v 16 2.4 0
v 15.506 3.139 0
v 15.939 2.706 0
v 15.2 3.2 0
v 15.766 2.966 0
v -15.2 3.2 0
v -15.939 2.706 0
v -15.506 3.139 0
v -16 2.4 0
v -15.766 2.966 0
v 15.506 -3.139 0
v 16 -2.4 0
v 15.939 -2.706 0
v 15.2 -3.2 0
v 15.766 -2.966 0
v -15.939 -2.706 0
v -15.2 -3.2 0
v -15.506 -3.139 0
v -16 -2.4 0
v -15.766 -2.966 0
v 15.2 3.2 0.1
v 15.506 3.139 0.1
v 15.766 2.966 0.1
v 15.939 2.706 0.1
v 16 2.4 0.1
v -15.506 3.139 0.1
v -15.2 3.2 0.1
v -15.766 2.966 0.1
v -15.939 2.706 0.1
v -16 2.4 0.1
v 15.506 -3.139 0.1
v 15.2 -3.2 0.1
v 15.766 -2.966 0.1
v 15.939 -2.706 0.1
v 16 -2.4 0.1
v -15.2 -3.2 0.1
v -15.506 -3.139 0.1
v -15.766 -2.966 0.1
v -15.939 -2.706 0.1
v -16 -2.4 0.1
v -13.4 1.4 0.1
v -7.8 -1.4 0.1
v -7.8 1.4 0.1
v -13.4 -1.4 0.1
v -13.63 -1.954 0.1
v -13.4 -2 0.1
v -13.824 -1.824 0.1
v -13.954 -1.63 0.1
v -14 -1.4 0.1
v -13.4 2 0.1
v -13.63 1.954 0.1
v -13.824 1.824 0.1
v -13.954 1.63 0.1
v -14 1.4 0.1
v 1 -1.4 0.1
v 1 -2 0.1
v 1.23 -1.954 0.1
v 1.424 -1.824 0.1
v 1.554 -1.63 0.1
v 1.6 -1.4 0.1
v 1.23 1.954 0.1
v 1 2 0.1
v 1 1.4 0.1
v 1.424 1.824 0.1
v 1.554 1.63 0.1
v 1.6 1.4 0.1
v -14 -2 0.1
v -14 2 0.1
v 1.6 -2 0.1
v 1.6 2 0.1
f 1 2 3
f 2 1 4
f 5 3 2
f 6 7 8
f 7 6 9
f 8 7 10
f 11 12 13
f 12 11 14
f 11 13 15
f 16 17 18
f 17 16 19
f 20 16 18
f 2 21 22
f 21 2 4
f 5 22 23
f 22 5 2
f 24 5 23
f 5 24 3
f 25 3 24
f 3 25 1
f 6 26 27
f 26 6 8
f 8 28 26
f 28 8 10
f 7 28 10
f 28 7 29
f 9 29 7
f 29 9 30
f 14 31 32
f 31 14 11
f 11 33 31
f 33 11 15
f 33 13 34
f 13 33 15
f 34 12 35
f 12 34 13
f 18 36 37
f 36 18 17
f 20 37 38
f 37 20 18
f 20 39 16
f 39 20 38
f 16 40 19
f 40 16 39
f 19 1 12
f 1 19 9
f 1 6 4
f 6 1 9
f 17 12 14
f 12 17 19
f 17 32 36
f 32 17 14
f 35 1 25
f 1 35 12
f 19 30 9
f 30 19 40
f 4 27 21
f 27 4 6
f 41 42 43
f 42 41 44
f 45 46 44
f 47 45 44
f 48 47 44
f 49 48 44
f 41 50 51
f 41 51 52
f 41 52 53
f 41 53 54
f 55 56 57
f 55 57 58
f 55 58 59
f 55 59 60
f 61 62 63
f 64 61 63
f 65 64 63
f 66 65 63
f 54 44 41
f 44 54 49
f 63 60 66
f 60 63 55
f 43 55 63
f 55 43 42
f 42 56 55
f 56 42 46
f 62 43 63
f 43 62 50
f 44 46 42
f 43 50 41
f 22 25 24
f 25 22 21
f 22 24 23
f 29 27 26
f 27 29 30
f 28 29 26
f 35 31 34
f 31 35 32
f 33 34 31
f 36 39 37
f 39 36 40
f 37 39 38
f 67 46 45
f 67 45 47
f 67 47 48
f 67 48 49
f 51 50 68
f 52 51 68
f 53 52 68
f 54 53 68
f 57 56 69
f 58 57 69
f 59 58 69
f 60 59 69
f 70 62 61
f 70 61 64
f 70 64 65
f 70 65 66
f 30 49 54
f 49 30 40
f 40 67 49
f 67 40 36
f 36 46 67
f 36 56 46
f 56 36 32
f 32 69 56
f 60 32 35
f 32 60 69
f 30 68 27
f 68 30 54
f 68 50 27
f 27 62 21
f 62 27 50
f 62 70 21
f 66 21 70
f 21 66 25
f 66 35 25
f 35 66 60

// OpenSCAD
// file: ../p/4-4edge.scad
use <../lib.scad>
$fa=1; $fs=0.2;
function ldraw_lib__4_4edge(realsolid=false) = [
// 0 Circle 1.0
// 0 Name: 4-4edge.dat
// 0 Author: James Jessiman
// 0 !LDRAW_ORG Primitive UPDATE 2017-01
// 0 !LICENSE Licensed under CC BY 2.0 and CC BY 4.0 : see CAreadme.txt
// 
// 0 BFC CERTIFY CCW
  [0,"BFC","CERTIFY"],
  [0,"BFC","CCW"],
// 
// 0 !HISTORY 1998-12-15 [PTadmin] Official Update 1998-10
// 0 !HISTORY 2005-12-28 [PTadmin] Official Update 2005-01
// 0 !HISTORY 2007-06-24 [PTadmin] Header formatted for Contributor Agreement
// 0 !HISTORY 2008-07-01 [PTadmin] Official Update 2008-01
// 0 !HISTORY 2017-01-15 [Steffen] BFCed
// 0 !HISTORY 2017-12-30 [PTadmin] Official Update 2017-01
// 
// 
// 2 24 1 0 0 0.9239 0 0.3827
  [2,24,1,0,0,0.9239,0,0.3827],
// 2 24 0.9239 0 0.3827 0.7071 0 0.7071
  [2,24,0.9239,0,0.3827,0.7071,0,0.7071],
// 2 24 0.7071 0 0.7071 0.3827 0 0.9239
  [2,24,0.7071,0,0.7071,0.3827,0,0.9239],
// 2 24 0.3827 0 0.9239 0 0 1
  [2,24,0.3827,0,0.9239,0,0,1],
// 2 24 0 0 1 -0.3827 0 0.9239
  [2,24,0,0,1,-0.3827,0,0.9239],
// 2 24 -0.3827 0 0.9239 -0.7071 0 0.7071
  [2,24,-0.3827,0,0.9239,-0.7071,0,0.7071],
// 2 24 -0.7071 0 0.7071 -0.9239 0 0.3827
  [2,24,-0.7071,0,0.7071,-0.9239,0,0.3827],
// 2 24 -0.9239 0 0.3827 -1 0 -0
  [2,24,-0.9239,0,0.3827,-1,0,-0],
// 2 24 -1 0 -0 -0.9239 0 -0.3827
  [2,24,-1,0,-0,-0.9239,0,-0.3827],
// 2 24 -0.9239 0 -0.3827 -0.7071 0 -0.7071
  [2,24,-0.9239,0,-0.3827,-0.7071,0,-0.7071],
// 2 24 -0.7071 0 -0.7071 -0.3827 0 -0.9239
  [2,24,-0.7071,0,-0.7071,-0.3827,0,-0.9239],
// 2 24 -0.3827 0 -0.9239 0 0 -1
  [2,24,-0.3827,0,-0.9239,0,0,-1],
// 2 24 0 0 -1 0.3827 0 -0.9239
  [2,24,0,0,-1,0.3827,0,-0.9239],
// 2 24 0.3827 0 -0.9239 0.7071 0 -0.7071
  [2,24,0.3827,0,-0.9239,0.7071,0,-0.7071],
// 2 24 0.7071 0 -0.7071 0.9239 0 -0.3827
  [2,24,0.7071,0,-0.7071,0.9239,0,-0.3827],
// 2 24 0.9239 0 -0.3827 1 0 0
  [2,24,0.9239,0,-0.3827,1,0,0],
];
module ldraw_lib__4_4edge(step=0, col=false, unit=2/5, alt=false, line=0.2, solid=!$preview)
    makepoly(ldraw_lib__4_4edge(solid), step=step, col=col, unit=unit, alt=alt, line=line, solid=solid);
ldraw_lib__4_4edge(line=0.2);
// file: ../p/4-4disc.scad
use <../lib.scad>
$fa=1; $fs=0.2;
function ldraw_lib__4_4disc(realsolid=false) = [
// 0 Disc 1.0
// 0 Name: 4-4disc.dat
// 0 Author: James Jessiman
// 0 !LDRAW_ORG Primitive UPDATE 2002-02
// 0 !LICENSE Licensed under CC BY 2.0 and CC BY 4.0 : see CAreadme.txt
// 
// 0 BFC CERTIFY CCW
  [0,"BFC","CERTIFY"],
  [0,"BFC","CCW"],
// 
// 0 !HISTORY 1998-12-15 [PTadmin] Official Update 1998-10
// 0 !HISTORY 2002-03-23 [sbliss] Added BFC statement
// 0 !HISTORY 2002-04-25 [PTadmin] Official Update 2002-02
// 0 !HISTORY 2007-06-24 [PTadmin] Header formatted for Contributor Agreement
// 0 !HISTORY 2008-07-01 [PTadmin] Official Update 2008-01
// 
// 
// 3 16 0 0 0 1 0 0 0.9239 0 0.3827
  [3,16,0,0,0,1,0,0,0.9239,0,0.3827],
// 3 16 0 0 0 0.9239 0 0.3827 0.7071 0 0.7071
  [3,16,0,0,0,0.9239,0,0.3827,0.7071,0,0.7071],
// 3 16 0 0 0 0.7071 0 0.7071 0.3827 0 0.9239
  [3,16,0,0,0,0.7071,0,0.7071,0.3827,0,0.9239],
// 3 16 0 0 0 0.3827 0 0.9239 0 0 1
  [3,16,0,0,0,0.3827,0,0.9239,0,0,1],
// 3 16 0 0 0 0 0 1 -0.3827 0 0.9239
  [3,16,0,0,0,0,0,1,-0.3827,0,0.9239],
// 3 16 0 0 0 -0.3827 0 0.9239 -0.7071 0 0.7071
  [3,16,0,0,0,-0.3827,0,0.9239,-0.7071,0,0.7071],
// 3 16 0 0 0 -0.7071 0 0.7071 -0.9239 0 0.3827
  [3,16,0,0,0,-0.7071,0,0.7071,-0.9239,0,0.3827],
// 3 16 0 0 0 -0.9239 0 0.3827 -1 0 -0
  [3,16,0,0,0,-0.9239,0,0.3827,-1,0,-0],
// 3 16 0 0 0 -1 0 -0 -0.9239 0 -0.3827
  [3,16,0,0,0,-1,0,-0,-0.9239,0,-0.3827],
// 3 16 0 0 0 -0.9239 0 -0.3827 -0.7071 0 -0.7071
  [3,16,0,0,0,-0.9239,0,-0.3827,-0.7071,0,-0.7071],
// 3 16 0 0 0 -0.7071 0 -0.7071 -0.3827 0 -0.9239
  [3,16,0,0,0,-0.7071,0,-0.7071,-0.3827,0,-0.9239],
// 3 16 0 0 0 -0.3827 0 -0.9239 0 0 -1
  [3,16,0,0,0,-0.3827,0,-0.9239,0,0,-1],
// 3 16 0 0 0 0 0 -1 0.3827 0 -0.9239
  [3,16,0,0,0,0,0,-1,0.3827,0,-0.9239],
// 3 16 0 0 0 0.3827 0 -0.9239 0.7071 0 -0.7071
  [3,16,0,0,0,0.3827,0,-0.9239,0.7071,0,-0.7071],
// 3 16 0 0 0 0.7071 0 -0.7071 0.9239 0 -0.3827
  [3,16,0,0,0,0.7071,0,-0.7071,0.9239,0,-0.3827],
// 3 16 0 0 0 0.9239 0 -0.3827 1 0 0
  [3,16,0,0,0,0.9239,0,-0.3827,1,0,0],
// 0
];
module ldraw_lib__4_4disc(step=0, col=false, unit=2/5, alt=false, line=0.2, solid=!$preview)
    makepoly(ldraw_lib__4_4disc(solid), step=step, col=col, unit=unit, alt=alt, line=line, solid=solid);
ldraw_lib__4_4disc(line=0.2);
// file: ../p/4-4cyli.scad
use <../lib.scad>
$fa=1; $fs=0.2;
function ldraw_lib__4_4cyli(realsolid=false) = [
// 0 Cylinder 1.0
// 0 Name: 4-4cyli.dat
// 0 Author: James Jessiman
// 0 !LDRAW_ORG Primitive UPDATE 2005-01
// 0 !LICENSE Licensed under CC BY 2.0 and CC BY 4.0 : see CAreadme.txt
// 
// 0 BFC CERTIFY CCW
  [0,"BFC","CERTIFY"],
  [0,"BFC","CCW"],
// 
// 0 !HISTORY 1998-12-15 [PTadmin] Official Update 1998-10
// 0 !HISTORY 2002-03-23 [sbliss] Added BFC statement; merged headers from files in distributions LDraw 0.27 and Complete.
// 0 !HISTORY 2002-04-25 [PTadmin] Official Update 2002-02
// 0 !HISTORY 2004-12-14 [guyvivan] BFC CCW
// 0 !HISTORY 2005-12-28 [PTadmin] Official Update 2005-01
// 0 !HISTORY 2007-06-24 [PTadmin] Header formatted for Contributor Agreement
// 0 !HISTORY 2008-07-01 [PTadmin] Official Update 2008-01
// 
// 
// 4 16 1 1 0 0.9239 1 0.3827 0.9239 0 0.3827 1 0 0
  [4,16,1,1,0,0.9239,1,0.3827,0.9239,0,0.3827,1,0,0],
// 5 24 1 0 0 1 1 0 0.9239 0 0.3827 0.9239 0 -0.3827
  [5,24,1,0,0,1,1,0,0.9239,0,0.3827,0.9239,0,-0.3827],
// 4 16 0.9239 1 0.3827 0.7071 1 0.7071 0.7071 0 0.7071 0.9239 0 0.3827
  [4,16,0.9239,1,0.3827,0.7071,1,0.7071,0.7071,0,0.7071,0.9239,0,0.3827],
// 5 24 0.9239 0 0.3827 0.9239 1 0.3827 0.7071 0 0.7071 1 0 0
  [5,24,0.9239,0,0.3827,0.9239,1,0.3827,0.7071,0,0.7071,1,0,0],
// 4 16 0.7071 1 0.7071 0.3827 1 0.9239 0.3827 0 0.9239 0.7071 0 0.7071
  [4,16,0.7071,1,0.7071,0.3827,1,0.9239,0.3827,0,0.9239,0.7071,0,0.7071],
// 5 24 0.7071 0 0.7071 0.7071 1 0.7071 0.3827 0 0.9239 0.9239 0 0.3827
  [5,24,0.7071,0,0.7071,0.7071,1,0.7071,0.3827,0,0.9239,0.9239,0,0.3827],
// 4 16 0.3827 1 0.9239 0 1 1 0 0 1 0.3827 0 0.9239
  [4,16,0.3827,1,0.9239,0,1,1,0,0,1,0.3827,0,0.9239],
// 5 24 0.3827 0 0.9239 0.3827 1 0.9239 0 0 1 0.7071 0 0.7071
  [5,24,0.3827,0,0.9239,0.3827,1,0.9239,0,0,1,0.7071,0,0.7071],
// 4 16 0 1 1 -0.3827 1 0.9239 -0.3827 0 0.9239 0 0 1
  [4,16,0,1,1,-0.3827,1,0.9239,-0.3827,0,0.9239,0,0,1],
// 5 24 0 0 1 0 1 1 -0.3827 0 0.9239 0.3827 0 0.9239
  [5,24,0,0,1,0,1,1,-0.3827,0,0.9239,0.3827,0,0.9239],
// 4 16 -0.3827 1 0.9239 -0.7071 1 0.7071 -0.7071 0 0.7071 -0.3827 0 0.9239
  [4,16,-0.3827,1,0.9239,-0.7071,1,0.7071,-0.7071,0,0.7071,-0.3827,0,0.9239],
// 5 24 -0.3827 0 0.9239 -0.3827 1 0.9239 -0.7071 0 0.7071 0 0 1
  [5,24,-0.3827,0,0.9239,-0.3827,1,0.9239,-0.7071,0,0.7071,0,0,1],
// 4 16 -0.7071 1 0.7071 -0.9239 1 0.3827 -0.9239 0 0.3827 -0.7071 0 0.7071
  [4,16,-0.7071,1,0.7071,-0.9239,1,0.3827,-0.9239,0,0.3827,-0.7071,0,0.7071],
// 5 24 -0.7071 0 0.7071 -0.7071 1 0.7071 -0.9239 0 0.3827 -0.3827 0 0.9239
  [5,24,-0.7071,0,0.7071,-0.7071,1,0.7071,-0.9239,0,0.3827,-0.3827,0,0.9239],
// 4 16 -0.9239 1 0.3827 -1 1 0 -1 0 0 -0.9239 0 0.3827
  [4,16,-0.9239,1,0.3827,-1,1,0,-1,0,0,-0.9239,0,0.3827],
// 5 24 -0.9239 0 0.3827 -0.9239 1 0.3827 -1 0 0 -0.7071 0 0.7071
  [5,24,-0.9239,0,0.3827,-0.9239,1,0.3827,-1,0,0,-0.7071,0,0.7071],
// 4 16 -1 1 0 -0.9239 1 -0.3827 -0.9239 0 -0.3827 -1 0 0
  [4,16,-1,1,0,-0.9239,1,-0.3827,-0.9239,0,-0.3827,-1,0,0],
// 5 24 -1 0 0 -1 1 0 -0.9239 0 -0.3827 -0.9239 0 0.3827
  [5,24,-1,0,0,-1,1,0,-0.9239,0,-0.3827,-0.9239,0,0.3827],
// 4 16 -0.9239 1 -0.3827 -0.7071 1 -0.7071 -0.7071 0 -0.7071 -0.9239 0 -0.3827
  [4,16,-0.9239,1,-0.3827,-0.7071,1,-0.7071,-0.7071,0,-0.7071,-0.9239,0,-0.3827],
// 5 24 -0.9239 0 -0.3827 -0.9239 1 -0.3827 -0.7071 0 -0.7071 -1 0 0
  [5,24,-0.9239,0,-0.3827,-0.9239,1,-0.3827,-0.7071,0,-0.7071,-1,0,0],
// 4 16 -0.7071 1 -0.7071 -0.3827 1 -0.9239 -0.3827 0 -0.9239 -0.7071 0 -0.7071
  [4,16,-0.7071,1,-0.7071,-0.3827,1,-0.9239,-0.3827,0,-0.9239,-0.7071,0,-0.7071],
// 5 24 -0.7071 0 -0.7071 -0.7071 1 -0.7071 -0.3827 0 -0.9239 -0.9239 0 -0.3827
  [5,24,-0.7071,0,-0.7071,-0.7071,1,-0.7071,-0.3827,0,-0.9239,-0.9239,0,-0.3827],
// 4 16 -0.3827 1 -0.9239 0 1 -1 0 0 -1 -0.3827 0 -0.9239
  [4,16,-0.3827,1,-0.9239,0,1,-1,0,0,-1,-0.3827,0,-0.9239],
// 5 24 -0.3827 0 -0.9239 -0.3827 1 -0.9239 0 0 -1 -0.7071 0 -0.7071
  [5,24,-0.3827,0,-0.9239,-0.3827,1,-0.9239,0,0,-1,-0.7071,0,-0.7071],
// 4 16 0 1 -1 0.3827 1 -0.9239 0.3827 0 -0.9239 0 0 -1
  [4,16,0,1,-1,0.3827,1,-0.9239,0.3827,0,-0.9239,0,0,-1],
// 5 24 0 0 -1 0 1 -1 0.3827 0 -0.9239 -0.3827 0 -0.9239
  [5,24,0,0,-1,0,1,-1,0.3827,0,-0.9239,-0.3827,0,-0.9239],
// 4 16 0.3827 1 -0.9239 0.7071 1 -0.7071 0.7071 0 -0.7071 0.3827 0 -0.9239
  [4,16,0.3827,1,-0.9239,0.7071,1,-0.7071,0.7071,0,-0.7071,0.3827,0,-0.9239],
// 5 24 0.3827 0 -0.9239 0.3827 1 -0.9239 0.7071 0 -0.7071 0 0 -1
  [5,24,0.3827,0,-0.9239,0.3827,1,-0.9239,0.7071,0,-0.7071,0,0,-1],
// 4 16 0.7071 1 -0.7071 0.9239 1 -0.3827 0.9239 0 -0.3827 0.7071 0 -0.7071
  [4,16,0.7071,1,-0.7071,0.9239,1,-0.3827,0.9239,0,-0.3827,0.7071,0,-0.7071],
// 5 24 0.7071 0 -0.7071 0.7071 1 -0.7071 0.9239 0 -0.3827 0.3827 0 -0.9239
  [5,24,0.7071,0,-0.7071,0.7071,1,-0.7071,0.9239,0,-0.3827,0.3827,0,-0.9239],
// 4 16 0.9239 1 -0.3827 1 1 0 1 0 0 0.9239 0 -0.3827
  [4,16,0.9239,1,-0.3827,1,1,0,1,0,0,0.9239,0,-0.3827],
// 5 24 0.9239 0 -0.3827 0.9239 1 -0.3827 1 0 0 0.7071 0 -0.7071
  [5,24,0.9239,0,-0.3827,0.9239,1,-0.3827,1,0,0,0.7071,0,-0.7071],
// 0
];
module ldraw_lib__4_4cyli(step=0, col=false, unit=2/5, alt=false, line=0.2, solid=!$preview)
    makepoly(ldraw_lib__4_4cyli(solid), step=step, col=col, unit=unit, alt=alt, line=line, solid=solid);
ldraw_lib__4_4cyli(line=0.2);
// file: ../p/stud3.scad
use <../lib.scad>
use <4-4cyli.scad>
use <4-4disc.scad>
use <4-4edge.scad>
$fa=1; $fs=0.2;
function ldraw_lib__stud3(realsolid=false) = realsolid ? 
    [openscad(translate([0,0,-eps()], o=cylinder(4+eps(), r=4)),2)] : [
// 0 Stud Tube Solid
// 0 Name: stud3.dat
// 0 Author: James Jessiman
// 0 !LDRAW_ORG Primitive UPDATE 2012-01
// 0 !LICENSE Licensed under CC BY 2.0 and CC BY 4.0 : see CAreadme.txt
// 
// 0 BFC CERTIFY CCW
  [0,"BFC","CERTIFY"],
  [0,"BFC","CCW"],
// 
// 0 !HISTORY 2002-04-04 [sbliss] Modified for BFC compliance
// 0 !HISTORY 2002-04-25 [PTadmin] Official Update 2002-02
// 0 !HISTORY 2007-06-24 [PTadmin] Header formatted for Contributor Agreement
// 0 !HISTORY 2008-07-01 [PTadmin] Official Update 2008-01
// 0 !HISTORY 2012-02-16 [Philo] Changed to CCW
// 0 !HISTORY 2012-03-30 [PTadmin] Official Update 2012-01
// 
// 
// 1 16 0 -4 0 4 0 0 0 1 0 0 0 4 4-4edge.dat
  [1,16,0,-4,0,4,0,0,0,1,0,0,0,4, ldraw_lib__4_4edge(realsolid)],
// 1 16 0 0 0 4 0 0 0 1 0 0 0 4 4-4edge.dat
  [1,16,0,0,0,4,0,0,0,1,0,0,0,4, ldraw_lib__4_4edge(realsolid)],
// 1 16 0 -4 0 4 0 0 0 1 0 0 0 4 4-4disc.dat
  [1,16,0,-4,0,4,0,0,0,1,0,0,0,4, ldraw_lib__4_4disc(realsolid)],
// 1 16 0 -4 0 4 0 0 0 4 0 0 0 4 4-4cyli.dat
  [1,16,0,-4,0,4,0,0,0,4,0,0,0,4, ldraw_lib__4_4cyli(realsolid)],
];
module ldraw_lib__stud3(step=0, col=false, unit=2/5, alt=false, line=0.2, solid=!$preview)
    makepoly(ldraw_lib__stud3(solid), step=step, col=col, unit=unit, alt=alt, line=line, solid=solid);
ldraw_lib__stud3(line=0.2);
// file: ../p/stud.scad
use <../lib.scad>
use <4-4cyli.scad>
use <4-4disc.scad>
use <4-4edge.scad>
$fa=1; $fs=0.2;
function ldraw_lib__stud(realsolid=false) = realsolid ? 
    [openscad(translate([0,0,-eps()], o=cylinder(4+eps(), r=6)),2)] : [
// 0 Stud
// 0 Name: stud.dat
// 0 Author: James Jessiman
// 0 !LDRAW_ORG Primitive UPDATE 2012-01
// 0 !LICENSE Licensed under CC BY 2.0 and CC BY 4.0 : see CAreadme.txt
// 
// 0 BFC CERTIFY CCW
  [0,"BFC","CERTIFY"],
  [0,"BFC","CCW"],
// 
// 0 !HISTORY 2002-04-04 [sbliss] Modified for BFC compliance
// 0 !HISTORY 2002-04-25 [PTadmin] Official Update 2002-02
// 0 !HISTORY 2007-06-24 [PTadmin] Header formatted for Contributor Agreement
// 0 !HISTORY 2008-07-01 [PTadmin] Official Update 2008-01
// 0 !HISTORY 2012-02-16 [Philo] Changed to CCW
// 0 !HISTORY 2012-03-30 [PTadmin] Official Update 2012-01
// 
// 
// 1 16 0 0 0 6 0 0 0 1 0 0 0 6 4-4edge.dat
  [1,16,0,0,0,6,0,0,0,1,0,0,0,6, ldraw_lib__4_4edge(realsolid)],
// 1 16 0 -4 0 6 0 0 0 1 0 0 0 6 4-4edge.dat
  [1,16,0,-4,0,6,0,0,0,1,0,0,0,6, ldraw_lib__4_4edge(realsolid)],
// 1 16 0 0 0 6 0 0 0 -4 0 0 0 6 4-4cyli.dat
  [1,16,0,0,0,6,0,0,0,-4,0,0,0,6, ldraw_lib__4_4cyli(realsolid)],
// 1 16 0 -4 0 6 0 0 0 1 0 0 0 6 4-4disc.dat
  [1,16,0,-4,0,6,0,0,0,1,0,0,0,6, ldraw_lib__4_4disc(realsolid)],
];
module ldraw_lib__stud(step=0, col=false, unit=2/5, alt=false, line=0.2, solid=!$preview)
    makepoly(ldraw_lib__stud(solid), step=step, col=col, unit=unit, alt=alt, line=line, solid=solid);
ldraw_lib__stud(line=0.2);
// file: ../p/box5.scad
use <../lib.scad>
$fa=1; $fs=0.2;
function ldraw_lib__box5(realsolid=false) = [
// 0 Box with 5 Faces and All Edges
// 0 Name: box5.dat
// 0 Author: James Jessiman
// 0 !LDRAW_ORG Primitive UPDATE 2012-01
// 0 !LICENSE Licensed under CC BY 2.0 and CC BY 4.0 : see CAreadme.txt
// 
// 0 BFC CERTIFY CCW
  [0,"BFC","CERTIFY"],
  [0,"BFC","CCW"],
// 
// 0 !HISTORY 2002-04-03 [sbliss] Modified for BFC compliance
// 0 !HISTORY 2002-04-25 [PTadmin] Official Update 2002-02
// 0 !HISTORY 2007-06-24 [PTadmin] Header formatted for Contributor Agreement
// 0 !HISTORY 2008-07-01 [PTadmin] Official Update 2008-01
// 0 !HISTORY 2012-02-16 [Philo] Changed to CCW
// 0 !HISTORY 2012-03-30 [PTadmin] Official Update 2012-01
// 
// 
// 2 24 1 1 1 -1 1 1
  [2,24,1,1,1,-1,1,1],
// 2 24 -1 1 1 -1 1 -1
  [2,24,-1,1,1,-1,1,-1],
// 2 24 -1 1 -1 1 1 -1
  [2,24,-1,1,-1,1,1,-1],
// 2 24 1 1 -1 1 1 1
  [2,24,1,1,-1,1,1,1],
// 2 24 1 0 1 -1 0 1
  [2,24,1,0,1,-1,0,1],
// 2 24 -1 0 1 -1 0 -1
  [2,24,-1,0,1,-1,0,-1],
// 2 24 -1 0 -1 1 0 -1
  [2,24,-1,0,-1,1,0,-1],
// 2 24 1 0 -1 1 0 1
  [2,24,1,0,-1,1,0,1],
// 2 24 1 0 1 1 1 1
  [2,24,1,0,1,1,1,1],
// 2 24 -1 0 1 -1 1 1
  [2,24,-1,0,1,-1,1,1],
// 2 24 1 0 -1 1 1 -1
  [2,24,1,0,-1,1,1,-1],
// 2 24 -1 0 -1 -1 1 -1
  [2,24,-1,0,-1,-1,1,-1],
// 4 16 -1 1 1 1 1 1 1 1 -1 -1 1 -1
  [4,16,-1,1,1,1,1,1,1,1,-1,-1,1,-1],
// 4 16 -1 1 1 -1 0 1 1 0 1 1 1 1
  [4,16,-1,1,1,-1,0,1,1,0,1,1,1,1],
// 4 16 -1 1 -1 -1 0 -1 -1 0 1 -1 1 1
  [4,16,-1,1,-1,-1,0,-1,-1,0,1,-1,1,1],
// 4 16 1 1 -1 1 0 -1 -1 0 -1 -1 1 -1
  [4,16,1,1,-1,1,0,-1,-1,0,-1,-1,1,-1],
// 4 16 1 1 1 1 0 1 1 0 -1 1 1 -1
  [4,16,1,1,1,1,0,1,1,0,-1,1,1,-1],
];
module ldraw_lib__box5(step=0, col=false, unit=2/5, alt=false, line=0.2, solid=!$preview)
    makepoly(ldraw_lib__box5(solid), step=step, col=col, unit=unit, alt=alt, line=line, solid=solid);
ldraw_lib__box5(line=0.2);
// file: ../p/box4t.scad
use <../lib.scad>
$fa=1; $fs=0.2;
function ldraw_lib__box4t(realsolid=false) = [
// 0 Box with 4 Adjacent Faces and All Edges
// 0 Name: box4t.dat
// 0 Author: Tore Eriksson [Tore_Eriksson]
// 0 !LDRAW_ORG Primitive UPDATE 2003-02
// 0 !LICENSE Licensed under CC BY 2.0 and CC BY 4.0 : see CAreadme.txt
// 
// 0 BFC CERTIFY CCW
  [0,"BFC","CERTIFY"],
  [0,"BFC","CCW"],
// 
// 0 !HISTORY 1997-09-29 [PTadmin] Official Update 1997-15
// 0 !HISTORY 2002-08-31 [izanette] Modified with WINDZ for BFC compliance
// 0 !HISTORY 2003-08-01 [PTadmin] Official Update 2003-02
// 0 !HISTORY 2007-06-24 [PTadmin] Header formatted for Contributor Agreement
// 0 !HISTORY 2008-07-01 [PTadmin] Official Update 2008-01
// 
// 
// 2 24 1 1 1 -1 1 1
  [2,24,1,1,1,-1,1,1],
// 2 24 -1 1 1 -1 1 -1
  [2,24,-1,1,1,-1,1,-1],
// 2 24 -1 1 -1 1 1 -1
  [2,24,-1,1,-1,1,1,-1],
// 2 24 1 1 -1 1 1 1
  [2,24,1,1,-1,1,1,1],
// 2 24 1 0 1 -1 0 1
  [2,24,1,0,1,-1,0,1],
// 2 24 -1 0 1 -1 0 -1
  [2,24,-1,0,1,-1,0,-1],
// 2 24 -1 0 -1 1 0 -1
  [2,24,-1,0,-1,1,0,-1],
// 2 24 1 0 -1 1 0 1
  [2,24,1,0,-1,1,0,1],
// 2 24 1 0 1 1 1 1
  [2,24,1,0,1,1,1,1],
// 2 24 -1 0 1 -1 1 1
  [2,24,-1,0,1,-1,1,1],
// 2 24 1 0 -1 1 1 -1
  [2,24,1,0,-1,1,1,-1],
// 2 24 -1 0 -1 -1 1 -1
  [2,24,-1,0,-1,-1,1,-1],
// 4 16 1 1 1 1 1 -1 -1 1 -1 -1 1 1
  [4,16,1,1,1,1,1,-1,-1,1,-1,-1,1,1],
// 4 16 1 1 1 -1 1 1 -1 0 1 1 0 1
  [4,16,1,1,1,-1,1,1,-1,0,1,1,0,1],
// 4 16 -1 1 1 -1 1 -1 -1 0 -1 -1 0 1
  [4,16,-1,1,1,-1,1,-1,-1,0,-1,-1,0,1],
// 0 4 16 -1 1 -1 -1 0 -1 1 0 -1 1 1 -1
// 4 16 1 1 -1 1 1 1 1 0 1 1 0 -1
  [4,16,1,1,-1,1,1,1,1,0,1,1,0,-1],
// 0
];
module ldraw_lib__box4t(step=0, col=false, unit=2/5, alt=false, line=0.2, solid=!$preview)
    makepoly(ldraw_lib__box4t(solid), step=step, col=col, unit=unit, alt=alt, line=line, solid=solid);
ldraw_lib__box4t(line=0.2);
// file: s/3004s01.scad
use <../../lib.scad>
use <../../p/box4t.scad>
use <../../p/box5.scad>
use <../../p/stud.scad>
use <../../p/stud3.scad>
$fa=1; $fs=0.2;
function ldraw_lib__s__3004s01(realsolid=false) = [
// 0 ~Brick  1 x  2 without Front Face
// 0 Name: s\3004s01.dat
// 0 Author: James Jessiman
// 0 !LDRAW_ORG Subpart UPDATE 2003-03
// 0 !LICENSE Licensed under CC BY 2.0 and CC BY 4.0 : see CAreadme.txt
// 
// 0 BFC CERTIFY CCW
  [0,"BFC","CERTIFY"],
  [0,"BFC","CCW"],
// 
// 0 !HISTORY 2003-09-07 [jriley] Subfiling, BFC
// 0 !HISTORY 2003-12-19 [PTadmin] Official Update 2003-03
// 0 !HISTORY 2007-08-29 [PTadmin] Header formatted for Contributor Agreement
// 0 !HISTORY 2008-07-01 [PTadmin] Official Update 2008-01
// 
// 
// 1 16 0 4 0 1 0 0 0 -5 0 0 0 1 stud3.dat
  [1,16,0,4,0,1,0,0,0,-5,0,0,0,1, ldraw_lib__stud3(realsolid)],
// 0 BFC INVERTNEXT
  [0,"BFC","INVERTNEXT"],
// 1 16 0 24 0 16 0 0 0 -20 0 0 0 6 box5.dat
  [1,16,0,24,0,16,0,0,0,-20,0,0,0,6, ldraw_lib__box5(realsolid)],
// 4 16 20 24 10 16 24 6 -16 24 6 -20 24 10
  [4,16,20,24,10,16,24,6,-16,24,6,-20,24,10],
// 4 16 -20 24 10 -16 24 6 -16 24 -6 -20 24 -10
  [4,16,-20,24,10,-16,24,6,-16,24,-6,-20,24,-10],
// 4 16 -20 24 -10 -16 24 -6 16 24 -6 20 24 -10
  [4,16,-20,24,-10,-16,24,-6,16,24,-6,20,24,-10],
// 4 16 20 24 -10 16 24 -6 16 24 6 20 24 10
  [4,16,20,24,-10,16,24,-6,16,24,6,20,24,10],
// 1 16 0 24 0 20 0 0 0 -24 0 0 0 10 box4t.dat
  [1,16,0,24,0,20,0,0,0,-24,0,0,0,10, ldraw_lib__box4t(realsolid)],
// 1 16 10 0 0 1 0 0 0 1 0 0 0 1 stud.dat
  [1,16,10,0,0,1,0,0,0,1,0,0,0,1, ldraw_lib__stud(realsolid)],
// 1 16 -10 0 0 1 0 0 0 1 0 0 0 1 stud.dat
  [1,16,-10,0,0,1,0,0,0,1,0,0,0,1, ldraw_lib__stud(realsolid)],
// 0
];
module ldraw_lib__s__3004s01(step=0, col=false, unit=2/5, alt=false, line=0.2, solid=!$preview)
    makepoly(ldraw_lib__s__3004s01(solid), step=step, col=col, unit=unit, alt=alt, line=line, solid=solid);
ldraw_lib__s__3004s01(line=0.2);
// file: 3004.scad
use <../lib.scad>
use <s/3004s01.scad>
$fa=1; $fs=0.2;
function ldraw_lib__3004(realsolid=false) = [
// 0 Brick  1 x  2
// 0 Name: 3004.dat
// 0 Author: James Jessiman
// 0 !LDRAW_ORG Part UPDATE 2022-05
// 0 !LICENSE Licensed under CC BY 2.0 and CC BY 4.0 : see CAreadme.txt
// 
// 0 BFC CERTIFY CCW
  [0,"BFC","CERTIFY"],
  [0,"BFC","CCW"],
// 
// 0 !HISTORY 2001-10-26 [PTadmin] Official Update 2001-01
// 0 !HISTORY 2002-05-07 {unknown} BFC Certification
// 0 !HISTORY 2002-06-11 [PTadmin] Official Update 2002-03
// 0 !HISTORY 2007-05-07 [PTadmin] Header formatted for Contributor Agreement
// 0 !HISTORY 2008-07-01 [PTadmin] Official Update 2008-01
// 0 !HISTORY 2022-08-04 [MagFors] Using subfile
// 0 !HISTORY 2022-09-15 [PTadmin] Official Update 2022-05
// 
// 
// 1 16 0 0 0 1 0 0 0 1 0 0 0 1 s\3004s01.dat
  [1,16,0,0,0,1,0,0,0,1,0,0,0,1, ldraw_lib__s__3004s01(realsolid)],
// 4 16 -20 24 -10 20 24 -10 20 0 -10 -20 0 -10
  [4,16,-20,24,-10,20,24,-10,20,0,-10,-20,0,-10],
];
module ldraw_lib__3004(step=0, col=false, unit=2/5, alt=false, line=0.2, solid=!$preview)
    makepoly(ldraw_lib__3004(solid), step=step, col=col, unit=unit, alt=alt, line=line, solid=solid);
ldraw_lib__3004(line=0.2);
// file: ../p/1-4ndis.scad
use <../lib.scad>
$fa=1; $fs=0.2;
function ldraw_lib__1_4ndis(realsolid=false) = [
// 0 Disc Negative 0.25
// 0 Name: 1-4ndis.dat
// 0 Author: James Jessiman
// 0 !LDRAW_ORG Primitive UPDATE 2012-01
// 0 !LICENSE Licensed under CC BY 2.0 and CC BY 4.0 : see CAreadme.txt
// 
// 0 BFC CERTIFY CCW
  [0,"BFC","CERTIFY"],
  [0,"BFC","CCW"],
// 
// 0 !HISTORY 2002-03-23 [sbliss] Added BFC Statement
// 0 !HISTORY 2002-04-25 [PTadmin] Official Update 2002-02
// 0 !HISTORY 2007-06-22 [PTadmin] Header formatted for Contributor Agreement
// 0 !HISTORY 2008-07-01 [PTadmin] Official Update 2008-01
// 0 !HISTORY 2012-02-16 [Philo] Changed to CCW
// 0 !HISTORY 2012-03-30 [PTadmin] Official Update 2012-01
// 
// 
// 3 16 0.9239 0 0.3827 1 0 0 1 0 1
  [3,16,0.9239,0,0.3827,1,0,0,1,0,1],
// 3 16 0.7071 0 0.7071 0.9239 0 0.3827 1 0 1
  [3,16,0.7071,0,0.7071,0.9239,0,0.3827,1,0,1],
// 3 16 0.3827 0 0.9239 0.7071 0 0.7071 1 0 1
  [3,16,0.3827,0,0.9239,0.7071,0,0.7071,1,0,1],
// 3 16 0 0 1 0.3827 0 0.9239 1 0 1
  [3,16,0,0,1,0.3827,0,0.9239,1,0,1],
];
module ldraw_lib__1_4ndis(step=0, col=false, unit=2/5, alt=false, line=0.2, solid=!$preview)
    makepoly(ldraw_lib__1_4ndis(solid), step=step, col=col, unit=unit, alt=alt, line=line, solid=solid);
ldraw_lib__1_4ndis(line=0.2);
// file: ../p/1-4disc.scad
use <../lib.scad>
$fa=1; $fs=0.2;
function ldraw_lib__1_4disc(realsolid=false) = [
// 0 Disc 0.25
// 0 Name: 1-4disc.dat
// 0 Author: James Jessiman
// 0 !LDRAW_ORG Primitive UPDATE 2002-02
// 0 !LICENSE Licensed under CC BY 2.0 and CC BY 4.0 : see CAreadme.txt
// 
// 0 BFC CERTIFY CCW
  [0,"BFC","CERTIFY"],
  [0,"BFC","CCW"],
// 
// 0 !HISTORY 2002-03-23 [sbliss] Added BFC statement.
// 0 !HISTORY 2002-04-25 [PTadmin] Official Update 2002-02
// 0 !HISTORY 2007-06-22 [PTadmin] Header formatted for Contributor Agreement
// 0 !HISTORY 2008-07-01 [PTadmin] Official Update 2008-01
// 
// 
// 3 16 0 0 0 1 0 0 0.9239 0 0.3827
  [3,16,0,0,0,1,0,0,0.9239,0,0.3827],
// 3 16 0 0 0 0.9239 0 0.3827 0.7071 0 0.7071
  [3,16,0,0,0,0.9239,0,0.3827,0.7071,0,0.7071],
// 3 16 0 0 0 0.7071 0 0.7071 0.3827 0 0.9239
  [3,16,0,0,0,0.7071,0,0.7071,0.3827,0,0.9239],
// 3 16 0 0 0 0.3827 0 0.9239 0 0 1
  [3,16,0,0,0,0.3827,0,0.9239,0,0,1],
// 0
];
module ldraw_lib__1_4disc(step=0, col=false, unit=2/5, alt=false, line=0.2, solid=!$preview)
    makepoly(ldraw_lib__1_4disc(solid), step=step, col=col, unit=unit, alt=alt, line=line, solid=solid);
ldraw_lib__1_4disc(line=0.2);
// file: ../p/1-4cyli.scad
use <../lib.scad>
$fa=1; $fs=0.2;
function ldraw_lib__1_4cyli(realsolid=false) = [
// 0 Cylinder 0.25
// 0 Name: 1-4cyli.dat
// 0 Author: James Jessiman
// 0 !LDRAW_ORG Primitive UPDATE 2012-01
// 0 !LICENSE Licensed under CC BY 2.0 and CC BY 4.0 : see CAreadme.txt
// 
// 0 BFC CERTIFY CCW
  [0,"BFC","CERTIFY"],
  [0,"BFC","CCW"],
// 
// 0 !HISTORY 2002-03-23 [sbliss] Added BFC statement.
// 0 !HISTORY 2002-04-25 [PTadmin] Official Update 2002-02
// 0 !HISTORY 2007-06-22 [PTadmin] Header formatted for Contributor Agreement
// 0 !HISTORY 2008-07-01 [PTadmin] Official Update 2008-01
// 0 !HISTORY 2012-02-16 [Philo] Changed to CCW
// 0 !HISTORY 2012-03-30 [PTadmin] Official Update 2012-01
// 
// 
// 4 16 1 1 0 0.9239 1 0.3827 0.9239 0 0.3827 1 0 0
  [4,16,1,1,0,0.9239,1,0.3827,0.9239,0,0.3827,1,0,0],
// 5 24 1 0 0 1 1 0 0.9239 0 0.3827 1 0 -1
  [5,24,1,0,0,1,1,0,0.9239,0,0.3827,1,0,-1],
// 4 16 0.9239 1 0.3827 0.7071 1 0.7071 0.7071 0 0.7071 0.9239 0 0.3827
  [4,16,0.9239,1,0.3827,0.7071,1,0.7071,0.7071,0,0.7071,0.9239,0,0.3827],
// 5 24 0.9239 0 0.3827 0.9239 1 0.3827 0.7071 0 0.7071 1 0 0
  [5,24,0.9239,0,0.3827,0.9239,1,0.3827,0.7071,0,0.7071,1,0,0],
// 4 16 0.7071 1 0.7071 0.3827 1 0.9239 0.3827 0 0.9239 0.7071 0 0.7071
  [4,16,0.7071,1,0.7071,0.3827,1,0.9239,0.3827,0,0.9239,0.7071,0,0.7071],
// 5 24 0.7071 0 0.7071 0.7071 1 0.7071 0.3827 0 0.9239 0.9239 0 0.3827
  [5,24,0.7071,0,0.7071,0.7071,1,0.7071,0.3827,0,0.9239,0.9239,0,0.3827],
// 4 16 0.3827 1 0.9239 0 1 1 0 0 1 0.3827 0 0.9239
  [4,16,0.3827,1,0.9239,0,1,1,0,0,1,0.3827,0,0.9239],
// 5 24 0.3827 0 0.9239 0.3827 1 0.9239 0 0 1 0.7071 0 0.7071
  [5,24,0.3827,0,0.9239,0.3827,1,0.9239,0,0,1,0.7071,0,0.7071],
// 5 24 0 0 1 0 1 1 0.3827 0 0.9239 -1 0 1
  [5,24,0,0,1,0,1,1,0.3827,0,0.9239,-1,0,1],
];
module ldraw_lib__1_4cyli(step=0, col=false, unit=2/5, alt=false, line=0.2, solid=!$preview)
    makepoly(ldraw_lib__1_4cyli(solid), step=step, col=col, unit=unit, alt=alt, line=line, solid=solid);
ldraw_lib__1_4cyli(line=0.2);
// file: ../p/1-4chrd.scad
use <../lib.scad>
$fa=1; $fs=0.2;
function ldraw_lib__1_4chrd(realsolid=false) = [
// 0 Chord 0.25
// 0 Name: 1-4chrd.dat
// 0 Author: Tony Hafner [hafhead]
// 0 !LDRAW_ORG Primitive UPDATE 2012-02
// 0 !LICENSE Licensed under CC BY 2.0 and CC BY 4.0 : see CAreadme.txt
// 
// 0 BFC CERTIFY CCW
  [0,"BFC","CERTIFY"],
  [0,"BFC","CCW"],
// 
// 0 !HISTORY 2004-04-22 [PTadmin] Official Update 2004-02
// 0 !HISTORY 2007-10-09 [PTadmin] Header formatted for Contributor Agreement
// 0 !HISTORY 2008-07-01 [PTadmin] Official Update 2008-01
// 0 !HISTORY 2012-08-02 [MMR1988] Re-creation with PrimGen2 and Rectifier
// 0 !HISTORY 2012-08-09 [PTadmin] Official Update 2012-02
// 
// 
// 4 16 0.9239 0 0.3827 0.3827 0 0.9239 0 0 1 1 0 0
  [4,16,0.9239,0,0.3827,0.3827,0,0.9239,0,0,1,1,0,0],
// 3 16 0.7071 0 0.7071 0.3827 0 0.9239 0.9239 0 0.3827
  [3,16,0.7071,0,0.7071,0.3827,0,0.9239,0.9239,0,0.3827],
];
module ldraw_lib__1_4chrd(step=0, col=false, unit=2/5, alt=false, line=0.2, solid=!$preview)
    makepoly(ldraw_lib__1_4chrd(solid), step=step, col=col, unit=unit, alt=alt, line=line, solid=solid);
ldraw_lib__1_4chrd(line=0.2);
// main file
use <../lib.scad>
use <../p/1-4chrd.scad>
use <../p/1-4cyli.scad>
use <../p/1-4disc.scad>
use <../p/1-4ndis.scad>
$fa=1; $fs=0.2;
function ldraw_lib__6283148m(realsolid=false) = [
// 0 Sticker  0.8 x  4.0 with Silver Rectangle in Black Panel on Light Bluish Grey
// 0 Name: 6283148m.dat
// 0 Author: Chris Dee [cwdee]
// 0 !LDRAW_ORG Part UPDATE 2022-03
// 0 !LICENSE Licensed under CC BY 2.0 and CC BY 4.0 : see CAreadme.txt
// 
// 0 BFC CERTIFY CCW
  [0,"BFC","CERTIFY"],
  [0,"BFC","CCW"],
// 
// 0 !KEYWORDS Defender, Land Rover, Set 42110
// 
// 0 !HISTORY 2022-05-07 [PTadmin] Official Update 2022-03
// 
// 
// 1 16 38 0 6 0 0 2 0 -1 0 2 0 0 1-4chrd.dat
  [1,16,38,0,6,0,0,2,0,-1,0,2,0,0, ldraw_lib__1_4chrd(realsolid)],
// 1 16 -38 0 6 0 0 -2 0 -1 0 2 0 0 1-4chrd.dat
  [1,16,-38,0,6,0,0,-2,0,-1,0,2,0,0, ldraw_lib__1_4chrd(realsolid)],
// 1 16 38 0 -6 0 0 2 0 -1 0 -2 0 0 1-4chrd.dat
  [1,16,38,0,-6,0,0,2,0,-1,0,-2,0,0, ldraw_lib__1_4chrd(realsolid)],
// 1 16 -38 0 -6 0 0 -2 0 -1 0 -2 0 0 1-4chrd.dat
  [1,16,-38,0,-6,0,0,-2,0,-1,0,-2,0,0, ldraw_lib__1_4chrd(realsolid)],
// 
// 1 16 38 0 6 0 0 2 0 -0.25 0 2 0 0 1-4cyli.dat
  [1,16,38,0,6,0,0,2,0,-0.25,0,2,0,0, ldraw_lib__1_4cyli(realsolid)],
// 1 16 -38 0 6 0 0 -2 0 -0.25 0 2 0 0 1-4cyli.dat
  [1,16,-38,0,6,0,0,-2,0,-0.25,0,2,0,0, ldraw_lib__1_4cyli(realsolid)],
// 1 16 38 0 -6 0 0 2 0 -0.25 0 -2 0 0 1-4cyli.dat
  [1,16,38,0,-6,0,0,2,0,-0.25,0,-2,0,0, ldraw_lib__1_4cyli(realsolid)],
// 1 16 -38 0 -6 0 0 -2 0 -0.25 0 -2 0 0 1-4cyli.dat
  [1,16,-38,0,-6,0,0,-2,0,-0.25,0,-2,0,0, ldraw_lib__1_4cyli(realsolid)],
// 
// 4 16 -40 0 -6 -40 0 6 40 0 6 40 0 -6
  [4,16,-40,0,-6,-40,0,6,40,0,6,40,0,-6],
// 4 16 -40 0 6 -38 0 8 38 0 8 40 0 6
  [4,16,-40,0,6,-38,0,8,38,0,8,40,0,6],
// 4 16 38 0 -8 -38 0 -8 -40 0 -6 40 0 -6
  [4,16,38,0,-8,-38,0,-8,-40,0,-6,40,0,-6],
// 4 16 -38 -0.25 -8 -38 0 -8 38 0 -8 38 -0.25 -8
  [4,16,-38,-0.25,-8,-38,0,-8,38,0,-8,38,-0.25,-8],
// 4 16 40 -0.25 6 40 -0.25 -6 40 0 -6 40 0 6
  [4,16,40,-0.25,6,40,-0.25,-6,40,0,-6,40,0,6],
// 4 16 -40 0 -6 -40 -0.25 -6 -40 -0.25 6 -40 0 6
  [4,16,-40,0,-6,-40,-0.25,-6,-40,-0.25,6,-40,0,6],
// 4 16 -38 0 8 -38 -0.25 8 38 -0.25 8 38 0 8
  [4,16,-38,0,8,-38,-0.25,8,38,-0.25,8,38,0,8],
// 0 // Panel
// 4 80 -33.5 -0.25 -3.5 -19.5 -0.25 -3.5 -19.5 -0.25 3.5 -33.5 -0.25 3.5
  [4,80,-33.5,-0.25,-3.5,-19.5,-0.25,-3.5,-19.5,-0.25,3.5,-33.5,-0.25,3.5],
// 1 0 -33.5 -0.25 -3.5 0 0 -1.5 0 1 0 -1.5 0 0 1-4disc.dat
  [1,0,-33.5,-0.25,-3.5,0,0,-1.5,0,1,0,-1.5,0,0, ldraw_lib__1_4disc(realsolid)],
// 1 0 -33.5 -0.25 3.5 0 0 -1.5 0 1 0 1.5 0 0 1-4disc.dat
  [1,0,-33.5,-0.25,3.5,0,0,-1.5,0,1,0,1.5,0,0, ldraw_lib__1_4disc(realsolid)],
// 1 0 2.5 -0.25 -3.5 0 0 1.5 0 1 0 -1.5 0 0 1-4disc.dat
  [1,0,2.5,-0.25,-3.5,0,0,1.5,0,1,0,-1.5,0,0, ldraw_lib__1_4disc(realsolid)],
// 1 0 2.5 -0.25 3.5 0 0 1.5 0 1 0 1.5 0 0 1-4disc.dat
  [1,0,2.5,-0.25,3.5,0,0,1.5,0,1,0,1.5,0,0, ldraw_lib__1_4disc(realsolid)],
// 4 0 -33.5 -0.25 -3.5 -33.5 -0.25 3.5 -35 -0.25 3.5 -35 -0.25 -3.5
  [4,0,-33.5,-0.25,-3.5,-33.5,-0.25,3.5,-35,-0.25,3.5,-35,-0.25,-3.5],
// 4 0 4 -0.25 -3.5 4 -0.25 3.5 2.5 -0.25 3.5 2.5 -0.25 -3.5
  [4,0,4,-0.25,-3.5,4,-0.25,3.5,2.5,-0.25,3.5,2.5,-0.25,-3.5],
// 4 0 2.5 -0.25 -3.5 2.5 -0.25 3.5 -19.5 -0.25 3.5 -19.5 -0.25 -3.5
  [4,0,2.5,-0.25,-3.5,2.5,-0.25,3.5,-19.5,-0.25,3.5,-19.5,-0.25,-3.5],
// 4 0 2.5 -0.25 -5 2.5 -0.25 -3.5 -19.5 -0.25 -3.5 -33.5 -0.25 -5
  [4,0,2.5,-0.25,-5,2.5,-0.25,-3.5,-19.5,-0.25,-3.5,-33.5,-0.25,-5],
// 4 0 -33.5 -0.25 5 -19.5 -0.25 3.5 2.5 -0.25 3.5 2.5 -0.25 5
  [4,0,-33.5,-0.25,5,-19.5,-0.25,3.5,2.5,-0.25,3.5,2.5,-0.25,5],
// 3 0 -33.5 -0.25 -3.5 -33.5 -0.25 -5 -19.5 -0.25 -3.5
  [3,0,-33.5,-0.25,-3.5,-33.5,-0.25,-5,-19.5,-0.25,-3.5],
// 3 0 -19.5 -0.25 3.5 -33.5 -0.25 5 -33.5 -0.25 3.5
  [3,0,-19.5,-0.25,3.5,-33.5,-0.25,5,-33.5,-0.25,3.5],
// 0 // Background
// 1 71 38 -0.25 6 0 0 2 0 1 0 2 0 0 1-4chrd.dat
  [1,71,38,-0.25,6,0,0,2,0,1,0,2,0,0, ldraw_lib__1_4chrd(realsolid)],
// 1 71 -38 -0.25 6 0 0 -2 0 1 0 2 0 0 1-4chrd.dat
  [1,71,-38,-0.25,6,0,0,-2,0,1,0,2,0,0, ldraw_lib__1_4chrd(realsolid)],
// 1 71 38 -0.25 -6 0 0 2 0 1 0 -2 0 0 1-4chrd.dat
  [1,71,38,-0.25,-6,0,0,2,0,1,0,-2,0,0, ldraw_lib__1_4chrd(realsolid)],
// 1 71 -38 -0.25 -6 0 0 -2 0 1 0 -2 0 0 1-4chrd.dat
  [1,71,-38,-0.25,-6,0,0,-2,0,1,0,-2,0,0, ldraw_lib__1_4chrd(realsolid)],
// 
// 1 71 -33.5 -0.25 -3.5 0 0 -1.5 0 1 0 -1.5 0 0 1-4ndis.dat
  [1,71,-33.5,-0.25,-3.5,0,0,-1.5,0,1,0,-1.5,0,0, ldraw_lib__1_4ndis(realsolid)],
// 1 71 -33.5 -0.25 3.5 0 0 -1.5 0 1 0 1.5 0 0 1-4ndis.dat
  [1,71,-33.5,-0.25,3.5,0,0,-1.5,0,1,0,1.5,0,0, ldraw_lib__1_4ndis(realsolid)],
// 1 71 2.5 -0.25 -3.5 0 0 1.5 0 1 0 -1.5 0 0 1-4ndis.dat
  [1,71,2.5,-0.25,-3.5,0,0,1.5,0,1,0,-1.5,0,0, ldraw_lib__1_4ndis(realsolid)],
// 1 71 2.5 -0.25 3.5 0 0 1.5 0 1 0 1.5 0 0 1-4ndis.dat
  [1,71,2.5,-0.25,3.5,0,0,1.5,0,1,0,1.5,0,0, ldraw_lib__1_4ndis(realsolid)],
// 
// 4 71 -40 -0.25 6 -40 -0.25 -6 -35 -0.25 -3.5 -35 -0.25 3.5
  [4,71,-40,-0.25,6,-40,-0.25,-6,-35,-0.25,-3.5,-35,-0.25,3.5],
// 4 71 -40 -0.25 -6 -38 -0.25 -8 -35 -0.25 -5 -35 -0.25 -3.5
  [4,71,-40,-0.25,-6,-38,-0.25,-8,-35,-0.25,-5,-35,-0.25,-3.5],
// 3 71 -38 -0.25 -8 -33.5 -0.25 -5 -35 -0.25 -5
  [3,71,-38,-0.25,-8,-33.5,-0.25,-5,-35,-0.25,-5],
// 4 71 -38 -0.25 -8 38 -0.25 -8 2.5 -0.25 -5 -33.5 -0.25 -5
  [4,71,-38,-0.25,-8,38,-0.25,-8,2.5,-0.25,-5,-33.5,-0.25,-5],
// 3 71 38 -0.25 -8 4 -0.25 -5 2.5 -0.25 -5
  [3,71,38,-0.25,-8,4,-0.25,-5,2.5,-0.25,-5],
// 4 71 38 -0.25 -8 40 -0.25 -6 4 -0.25 -3.5 4 -0.25 -5
  [4,71,38,-0.25,-8,40,-0.25,-6,4,-0.25,-3.5,4,-0.25,-5],
// 4 71 -35 -0.25 3.5 -35 -0.25 5 -38 -0.25 8 -40 -0.25 6
  [4,71,-35,-0.25,3.5,-35,-0.25,5,-38,-0.25,8,-40,-0.25,6],
// 3 71 -35 -0.25 5 -33.5 -0.25 5 -38 -0.25 8
  [3,71,-35,-0.25,5,-33.5,-0.25,5,-38,-0.25,8],
// 4 71 -33.5 -0.25 5 2.5 -0.25 5 38 -0.25 8 -38 -0.25 8
  [4,71,-33.5,-0.25,5,2.5,-0.25,5,38,-0.25,8,-38,-0.25,8],
// 3 71 2.5 -0.25 5 4 -0.25 5 38 -0.25 8
  [3,71,2.5,-0.25,5,4,-0.25,5,38,-0.25,8],
// 4 71 4 -0.25 5 4 -0.25 3.5 40 -0.25 6 38 -0.25 8
  [4,71,4,-0.25,5,4,-0.25,3.5,40,-0.25,6,38,-0.25,8],
// 4 71 40 -0.25 -6 40 -0.25 6 4 -0.25 3.5 4 -0.25 -3.5
  [4,71,40,-0.25,-6,40,-0.25,6,4,-0.25,3.5,4,-0.25,-3.5],
];
module ldraw_lib__6283148m(step=0, col=false, unit=2/5, alt=false, line=0.2, solid=!$preview)
    makepoly(ldraw_lib__6283148m(solid), step=step, col=col, unit=unit, alt=alt, line=line, solid=solid);
ldraw_lib__6283148m(line=0.2);
